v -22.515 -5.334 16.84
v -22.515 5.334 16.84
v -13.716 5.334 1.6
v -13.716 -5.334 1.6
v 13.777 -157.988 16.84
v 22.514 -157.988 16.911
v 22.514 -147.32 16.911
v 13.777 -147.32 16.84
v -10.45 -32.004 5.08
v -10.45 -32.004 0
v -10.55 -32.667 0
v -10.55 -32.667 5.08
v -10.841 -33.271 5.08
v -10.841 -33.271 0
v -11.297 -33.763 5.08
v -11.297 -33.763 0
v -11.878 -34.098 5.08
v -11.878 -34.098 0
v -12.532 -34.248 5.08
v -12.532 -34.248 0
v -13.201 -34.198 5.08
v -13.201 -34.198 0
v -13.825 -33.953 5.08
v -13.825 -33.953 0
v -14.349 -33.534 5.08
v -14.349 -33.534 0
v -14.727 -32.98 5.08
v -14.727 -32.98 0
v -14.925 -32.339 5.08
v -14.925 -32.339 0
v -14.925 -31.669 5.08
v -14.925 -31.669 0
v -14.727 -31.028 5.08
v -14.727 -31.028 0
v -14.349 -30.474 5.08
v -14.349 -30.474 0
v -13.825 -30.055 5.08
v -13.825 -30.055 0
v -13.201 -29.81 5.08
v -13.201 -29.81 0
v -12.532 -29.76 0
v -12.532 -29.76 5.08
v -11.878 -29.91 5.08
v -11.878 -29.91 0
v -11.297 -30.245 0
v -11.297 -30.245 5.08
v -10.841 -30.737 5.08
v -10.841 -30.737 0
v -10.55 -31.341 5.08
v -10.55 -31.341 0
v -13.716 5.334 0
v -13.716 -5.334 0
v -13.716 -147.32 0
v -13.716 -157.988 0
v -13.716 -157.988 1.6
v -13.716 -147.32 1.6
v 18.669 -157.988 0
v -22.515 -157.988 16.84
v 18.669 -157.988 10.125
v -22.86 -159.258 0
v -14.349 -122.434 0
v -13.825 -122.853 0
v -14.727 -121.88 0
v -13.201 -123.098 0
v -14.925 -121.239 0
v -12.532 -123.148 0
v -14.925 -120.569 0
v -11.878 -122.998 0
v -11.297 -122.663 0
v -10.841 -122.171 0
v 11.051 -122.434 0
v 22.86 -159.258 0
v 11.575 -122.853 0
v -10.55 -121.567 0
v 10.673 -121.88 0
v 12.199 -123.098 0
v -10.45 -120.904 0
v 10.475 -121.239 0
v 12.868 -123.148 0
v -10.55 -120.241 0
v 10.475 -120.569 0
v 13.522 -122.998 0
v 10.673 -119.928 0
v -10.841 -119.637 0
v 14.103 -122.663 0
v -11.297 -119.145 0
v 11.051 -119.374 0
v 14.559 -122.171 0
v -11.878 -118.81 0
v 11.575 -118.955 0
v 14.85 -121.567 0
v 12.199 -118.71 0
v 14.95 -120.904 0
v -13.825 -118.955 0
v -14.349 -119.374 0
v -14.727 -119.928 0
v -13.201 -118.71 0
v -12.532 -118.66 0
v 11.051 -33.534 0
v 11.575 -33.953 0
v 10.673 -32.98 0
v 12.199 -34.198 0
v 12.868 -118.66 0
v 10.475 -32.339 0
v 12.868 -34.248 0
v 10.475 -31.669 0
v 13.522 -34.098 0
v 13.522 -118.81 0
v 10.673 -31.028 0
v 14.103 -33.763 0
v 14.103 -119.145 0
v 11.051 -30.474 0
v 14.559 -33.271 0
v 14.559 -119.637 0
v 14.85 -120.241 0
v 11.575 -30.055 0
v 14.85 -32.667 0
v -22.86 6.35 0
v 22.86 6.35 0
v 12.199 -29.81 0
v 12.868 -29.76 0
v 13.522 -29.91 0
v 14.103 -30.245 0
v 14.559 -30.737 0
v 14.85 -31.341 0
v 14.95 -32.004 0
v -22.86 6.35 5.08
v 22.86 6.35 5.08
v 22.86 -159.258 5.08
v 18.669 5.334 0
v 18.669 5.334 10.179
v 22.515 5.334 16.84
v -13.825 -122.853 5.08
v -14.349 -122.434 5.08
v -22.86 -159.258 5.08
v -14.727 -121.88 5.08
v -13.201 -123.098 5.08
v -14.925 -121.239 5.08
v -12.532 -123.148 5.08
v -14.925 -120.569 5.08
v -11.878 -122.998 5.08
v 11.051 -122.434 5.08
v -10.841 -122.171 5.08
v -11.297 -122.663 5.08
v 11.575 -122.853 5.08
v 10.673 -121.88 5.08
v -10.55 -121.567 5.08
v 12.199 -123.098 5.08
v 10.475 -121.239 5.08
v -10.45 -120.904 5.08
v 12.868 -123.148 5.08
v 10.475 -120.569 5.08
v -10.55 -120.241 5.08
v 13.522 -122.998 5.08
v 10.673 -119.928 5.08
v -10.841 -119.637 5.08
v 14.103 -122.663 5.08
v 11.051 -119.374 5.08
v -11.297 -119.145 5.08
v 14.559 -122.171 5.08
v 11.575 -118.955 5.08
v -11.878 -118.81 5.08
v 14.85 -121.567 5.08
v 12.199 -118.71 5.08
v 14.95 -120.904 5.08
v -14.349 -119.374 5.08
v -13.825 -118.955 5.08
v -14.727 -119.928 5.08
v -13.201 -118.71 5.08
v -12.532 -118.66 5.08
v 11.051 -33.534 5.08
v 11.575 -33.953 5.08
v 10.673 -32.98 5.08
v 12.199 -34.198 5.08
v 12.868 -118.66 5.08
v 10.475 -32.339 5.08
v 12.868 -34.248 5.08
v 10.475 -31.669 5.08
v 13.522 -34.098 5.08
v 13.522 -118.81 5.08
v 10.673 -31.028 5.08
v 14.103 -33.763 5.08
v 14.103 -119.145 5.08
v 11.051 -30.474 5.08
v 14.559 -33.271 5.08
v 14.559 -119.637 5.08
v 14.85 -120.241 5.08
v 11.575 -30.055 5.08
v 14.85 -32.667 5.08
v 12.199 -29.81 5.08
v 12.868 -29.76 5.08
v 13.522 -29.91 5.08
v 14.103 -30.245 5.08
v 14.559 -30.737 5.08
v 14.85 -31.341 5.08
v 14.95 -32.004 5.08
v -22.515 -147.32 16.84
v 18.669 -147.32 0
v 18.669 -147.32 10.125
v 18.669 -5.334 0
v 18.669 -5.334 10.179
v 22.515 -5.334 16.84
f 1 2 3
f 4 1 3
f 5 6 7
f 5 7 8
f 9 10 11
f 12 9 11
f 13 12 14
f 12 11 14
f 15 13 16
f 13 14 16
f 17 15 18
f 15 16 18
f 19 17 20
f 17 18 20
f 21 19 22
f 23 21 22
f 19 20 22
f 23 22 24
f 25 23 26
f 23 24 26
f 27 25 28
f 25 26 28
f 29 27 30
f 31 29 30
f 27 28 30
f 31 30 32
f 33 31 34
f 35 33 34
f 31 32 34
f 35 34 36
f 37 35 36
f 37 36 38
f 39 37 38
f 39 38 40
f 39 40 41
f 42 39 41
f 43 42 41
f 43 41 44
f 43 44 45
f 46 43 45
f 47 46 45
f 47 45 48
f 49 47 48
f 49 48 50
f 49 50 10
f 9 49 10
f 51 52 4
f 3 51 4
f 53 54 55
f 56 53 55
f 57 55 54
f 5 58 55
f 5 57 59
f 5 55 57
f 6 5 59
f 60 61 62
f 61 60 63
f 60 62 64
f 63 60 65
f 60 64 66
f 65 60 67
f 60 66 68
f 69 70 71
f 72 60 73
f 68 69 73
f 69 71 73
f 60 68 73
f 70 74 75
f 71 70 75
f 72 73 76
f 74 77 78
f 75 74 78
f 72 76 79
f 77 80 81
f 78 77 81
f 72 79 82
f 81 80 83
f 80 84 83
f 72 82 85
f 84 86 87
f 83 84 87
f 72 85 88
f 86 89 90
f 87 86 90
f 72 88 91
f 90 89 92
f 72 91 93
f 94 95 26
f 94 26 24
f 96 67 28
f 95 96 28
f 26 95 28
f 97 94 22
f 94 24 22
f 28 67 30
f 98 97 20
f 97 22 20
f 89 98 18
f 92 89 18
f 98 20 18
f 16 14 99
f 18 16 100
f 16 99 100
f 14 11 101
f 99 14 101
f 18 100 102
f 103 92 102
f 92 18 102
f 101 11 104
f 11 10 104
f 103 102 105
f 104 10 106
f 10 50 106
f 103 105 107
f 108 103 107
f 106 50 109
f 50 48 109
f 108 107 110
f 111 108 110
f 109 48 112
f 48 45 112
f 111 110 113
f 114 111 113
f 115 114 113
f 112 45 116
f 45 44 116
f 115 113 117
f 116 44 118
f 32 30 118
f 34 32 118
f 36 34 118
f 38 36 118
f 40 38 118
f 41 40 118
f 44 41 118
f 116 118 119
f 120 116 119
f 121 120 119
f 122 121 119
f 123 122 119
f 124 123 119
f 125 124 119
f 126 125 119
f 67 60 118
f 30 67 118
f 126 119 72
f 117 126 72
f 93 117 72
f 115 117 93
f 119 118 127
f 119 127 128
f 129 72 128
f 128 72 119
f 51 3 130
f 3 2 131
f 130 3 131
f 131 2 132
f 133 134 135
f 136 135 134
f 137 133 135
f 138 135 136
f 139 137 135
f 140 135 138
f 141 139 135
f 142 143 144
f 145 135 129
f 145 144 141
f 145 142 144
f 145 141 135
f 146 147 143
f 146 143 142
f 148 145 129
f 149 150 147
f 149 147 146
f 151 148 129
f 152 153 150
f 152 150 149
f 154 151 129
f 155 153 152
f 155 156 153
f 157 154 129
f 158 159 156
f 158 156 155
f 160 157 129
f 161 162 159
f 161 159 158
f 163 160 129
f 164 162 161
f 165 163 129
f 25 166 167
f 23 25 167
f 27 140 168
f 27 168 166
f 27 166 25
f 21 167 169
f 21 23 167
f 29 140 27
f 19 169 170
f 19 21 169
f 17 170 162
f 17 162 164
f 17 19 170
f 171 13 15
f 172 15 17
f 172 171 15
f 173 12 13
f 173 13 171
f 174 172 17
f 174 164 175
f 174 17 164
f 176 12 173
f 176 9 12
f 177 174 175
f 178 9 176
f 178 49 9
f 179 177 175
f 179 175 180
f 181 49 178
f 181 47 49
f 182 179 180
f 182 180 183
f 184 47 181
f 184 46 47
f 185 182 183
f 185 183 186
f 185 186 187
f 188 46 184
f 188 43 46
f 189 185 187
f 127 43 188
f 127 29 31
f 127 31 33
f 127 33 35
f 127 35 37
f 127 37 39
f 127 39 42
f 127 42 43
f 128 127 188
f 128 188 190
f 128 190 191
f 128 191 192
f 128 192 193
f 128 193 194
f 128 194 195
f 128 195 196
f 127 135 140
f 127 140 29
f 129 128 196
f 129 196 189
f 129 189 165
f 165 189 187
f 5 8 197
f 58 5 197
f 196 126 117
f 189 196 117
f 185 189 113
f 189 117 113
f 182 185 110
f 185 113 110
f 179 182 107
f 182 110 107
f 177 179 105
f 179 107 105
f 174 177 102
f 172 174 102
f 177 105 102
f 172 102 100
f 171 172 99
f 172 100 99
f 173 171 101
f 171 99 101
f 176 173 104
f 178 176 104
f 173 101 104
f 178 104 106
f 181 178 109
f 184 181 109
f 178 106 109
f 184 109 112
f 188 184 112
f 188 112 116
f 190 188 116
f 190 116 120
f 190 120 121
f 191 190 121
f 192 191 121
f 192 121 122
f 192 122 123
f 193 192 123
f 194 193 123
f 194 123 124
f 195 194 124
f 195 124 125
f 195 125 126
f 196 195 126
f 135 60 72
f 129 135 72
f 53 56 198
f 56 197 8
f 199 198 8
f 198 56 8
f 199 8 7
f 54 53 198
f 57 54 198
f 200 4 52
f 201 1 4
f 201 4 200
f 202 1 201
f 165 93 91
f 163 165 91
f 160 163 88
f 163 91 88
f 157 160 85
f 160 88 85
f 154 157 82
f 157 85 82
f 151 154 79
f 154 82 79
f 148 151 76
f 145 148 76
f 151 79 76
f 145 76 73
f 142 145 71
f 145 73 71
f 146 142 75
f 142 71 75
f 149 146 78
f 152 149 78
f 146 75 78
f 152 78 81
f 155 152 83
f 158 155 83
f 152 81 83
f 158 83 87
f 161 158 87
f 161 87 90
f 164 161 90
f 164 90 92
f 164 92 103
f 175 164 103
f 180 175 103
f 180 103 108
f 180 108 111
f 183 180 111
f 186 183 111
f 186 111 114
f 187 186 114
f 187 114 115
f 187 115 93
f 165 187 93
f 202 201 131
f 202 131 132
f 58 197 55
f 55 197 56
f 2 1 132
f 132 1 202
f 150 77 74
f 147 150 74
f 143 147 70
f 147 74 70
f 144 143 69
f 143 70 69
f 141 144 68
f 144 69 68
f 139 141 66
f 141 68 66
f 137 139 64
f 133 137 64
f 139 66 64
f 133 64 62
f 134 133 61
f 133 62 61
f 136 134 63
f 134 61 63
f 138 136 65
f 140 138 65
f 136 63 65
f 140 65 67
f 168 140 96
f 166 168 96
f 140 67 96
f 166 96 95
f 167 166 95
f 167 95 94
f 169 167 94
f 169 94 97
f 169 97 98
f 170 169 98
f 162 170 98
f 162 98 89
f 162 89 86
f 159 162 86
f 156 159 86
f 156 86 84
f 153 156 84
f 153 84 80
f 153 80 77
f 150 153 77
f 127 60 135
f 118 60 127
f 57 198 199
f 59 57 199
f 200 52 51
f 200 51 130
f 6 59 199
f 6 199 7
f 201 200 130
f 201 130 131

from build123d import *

# Parameters (mm, degrees)
SKETCH_W     = 45.72
SKETCH_H     = 165.608
PAD_DEPTH    = 5.08
SKETCH005_R  = 2.25
HOLE_DEPTH   = 24.9936
SKETCH006_W  = 32.385
SKETCH006_H  = 16.8402
PAD005_DEPTH = 5.334
PAD006_DEPTH = 5.334
SKETCH008_W  = 32.385
SKETCH008_H  = 16.8402
PAD007_DEPTH = 10.668
PAD008_DEPTH = 10.668


with BuildPart() as body:
    # Sketch → Pad (new body)
    with BuildSketch(Plane.XY):
        with Locations((0, -76.454)):
            Rectangle(SKETCH_W, SKETCH_H)
    extrude(amount=PAD_DEPTH)

    # Sketch005 → Hole (cut)
    with BuildSketch(Plane(origin=(0, 0, 0), x_dir=(1, 0, 0), z_dir=(0, 0, -1))):
        with Locations((-12.7, 120.904)):
            Circle(SKETCH005_R)
        with Locations((-12.7, 32.004)):
            Circle(SKETCH005_R)
        with Locations((12.7, 120.904)):
            Circle(SKETCH005_R)
        with Locations((12.7, 32.004)):
            Circle(SKETCH005_R)
    extrude(amount=-HOLE_DEPTH, mode=Mode.SUBTRACT)


with BuildPart() as pad006:
    # Sketch006 → Pad005 (new body, symmetric)
    with BuildSketch(Plane.XZ):
        with Locations((2.4765, 8.4201)):
            Rectangle(SKETCH006_W, SKETCH006_H)
    extrude(amount=PAD005_DEPTH, both=True)

    # Sketch007 → Pad006 (new body, symmetric)
    with BuildSketch(Plane.XZ):
        Polygon((-13.716, 1.6002), (-13.716, 16.8402), (-22.514818, 16.8402), align=None)
        Polygon((13.716, 1.6002), (22.514818, 16.8402), (13.716, 16.8402), align=None)
    extrude(amount=PAD006_DEPTH, both=True)


with BuildPart() as pad008:
    # Sketch008 → Pad007 (new body)
    with BuildSketch(Plane.XZ.offset(147.32)):
        with Locations((2.4765, 8.4201)):
            Rectangle(SKETCH008_W, SKETCH008_H)
    extrude(amount=PAD007_DEPTH)

    # Sketch009 → Pad008 (new body)
    with BuildSketch(Plane.XZ.offset(147.32)):
        Polygon((-13.716, 1.6002), (-13.716, 16.8402), (-22.514818, 16.8402), align=None)
        Polygon((13.838348, 1.6002), (22.514164, 16.910556), (13.715632, 16.839706), align=None)
    extrude(amount=PAD008_DEPTH)


solid = Compound([body.part, pad006.part, pad008.part])
